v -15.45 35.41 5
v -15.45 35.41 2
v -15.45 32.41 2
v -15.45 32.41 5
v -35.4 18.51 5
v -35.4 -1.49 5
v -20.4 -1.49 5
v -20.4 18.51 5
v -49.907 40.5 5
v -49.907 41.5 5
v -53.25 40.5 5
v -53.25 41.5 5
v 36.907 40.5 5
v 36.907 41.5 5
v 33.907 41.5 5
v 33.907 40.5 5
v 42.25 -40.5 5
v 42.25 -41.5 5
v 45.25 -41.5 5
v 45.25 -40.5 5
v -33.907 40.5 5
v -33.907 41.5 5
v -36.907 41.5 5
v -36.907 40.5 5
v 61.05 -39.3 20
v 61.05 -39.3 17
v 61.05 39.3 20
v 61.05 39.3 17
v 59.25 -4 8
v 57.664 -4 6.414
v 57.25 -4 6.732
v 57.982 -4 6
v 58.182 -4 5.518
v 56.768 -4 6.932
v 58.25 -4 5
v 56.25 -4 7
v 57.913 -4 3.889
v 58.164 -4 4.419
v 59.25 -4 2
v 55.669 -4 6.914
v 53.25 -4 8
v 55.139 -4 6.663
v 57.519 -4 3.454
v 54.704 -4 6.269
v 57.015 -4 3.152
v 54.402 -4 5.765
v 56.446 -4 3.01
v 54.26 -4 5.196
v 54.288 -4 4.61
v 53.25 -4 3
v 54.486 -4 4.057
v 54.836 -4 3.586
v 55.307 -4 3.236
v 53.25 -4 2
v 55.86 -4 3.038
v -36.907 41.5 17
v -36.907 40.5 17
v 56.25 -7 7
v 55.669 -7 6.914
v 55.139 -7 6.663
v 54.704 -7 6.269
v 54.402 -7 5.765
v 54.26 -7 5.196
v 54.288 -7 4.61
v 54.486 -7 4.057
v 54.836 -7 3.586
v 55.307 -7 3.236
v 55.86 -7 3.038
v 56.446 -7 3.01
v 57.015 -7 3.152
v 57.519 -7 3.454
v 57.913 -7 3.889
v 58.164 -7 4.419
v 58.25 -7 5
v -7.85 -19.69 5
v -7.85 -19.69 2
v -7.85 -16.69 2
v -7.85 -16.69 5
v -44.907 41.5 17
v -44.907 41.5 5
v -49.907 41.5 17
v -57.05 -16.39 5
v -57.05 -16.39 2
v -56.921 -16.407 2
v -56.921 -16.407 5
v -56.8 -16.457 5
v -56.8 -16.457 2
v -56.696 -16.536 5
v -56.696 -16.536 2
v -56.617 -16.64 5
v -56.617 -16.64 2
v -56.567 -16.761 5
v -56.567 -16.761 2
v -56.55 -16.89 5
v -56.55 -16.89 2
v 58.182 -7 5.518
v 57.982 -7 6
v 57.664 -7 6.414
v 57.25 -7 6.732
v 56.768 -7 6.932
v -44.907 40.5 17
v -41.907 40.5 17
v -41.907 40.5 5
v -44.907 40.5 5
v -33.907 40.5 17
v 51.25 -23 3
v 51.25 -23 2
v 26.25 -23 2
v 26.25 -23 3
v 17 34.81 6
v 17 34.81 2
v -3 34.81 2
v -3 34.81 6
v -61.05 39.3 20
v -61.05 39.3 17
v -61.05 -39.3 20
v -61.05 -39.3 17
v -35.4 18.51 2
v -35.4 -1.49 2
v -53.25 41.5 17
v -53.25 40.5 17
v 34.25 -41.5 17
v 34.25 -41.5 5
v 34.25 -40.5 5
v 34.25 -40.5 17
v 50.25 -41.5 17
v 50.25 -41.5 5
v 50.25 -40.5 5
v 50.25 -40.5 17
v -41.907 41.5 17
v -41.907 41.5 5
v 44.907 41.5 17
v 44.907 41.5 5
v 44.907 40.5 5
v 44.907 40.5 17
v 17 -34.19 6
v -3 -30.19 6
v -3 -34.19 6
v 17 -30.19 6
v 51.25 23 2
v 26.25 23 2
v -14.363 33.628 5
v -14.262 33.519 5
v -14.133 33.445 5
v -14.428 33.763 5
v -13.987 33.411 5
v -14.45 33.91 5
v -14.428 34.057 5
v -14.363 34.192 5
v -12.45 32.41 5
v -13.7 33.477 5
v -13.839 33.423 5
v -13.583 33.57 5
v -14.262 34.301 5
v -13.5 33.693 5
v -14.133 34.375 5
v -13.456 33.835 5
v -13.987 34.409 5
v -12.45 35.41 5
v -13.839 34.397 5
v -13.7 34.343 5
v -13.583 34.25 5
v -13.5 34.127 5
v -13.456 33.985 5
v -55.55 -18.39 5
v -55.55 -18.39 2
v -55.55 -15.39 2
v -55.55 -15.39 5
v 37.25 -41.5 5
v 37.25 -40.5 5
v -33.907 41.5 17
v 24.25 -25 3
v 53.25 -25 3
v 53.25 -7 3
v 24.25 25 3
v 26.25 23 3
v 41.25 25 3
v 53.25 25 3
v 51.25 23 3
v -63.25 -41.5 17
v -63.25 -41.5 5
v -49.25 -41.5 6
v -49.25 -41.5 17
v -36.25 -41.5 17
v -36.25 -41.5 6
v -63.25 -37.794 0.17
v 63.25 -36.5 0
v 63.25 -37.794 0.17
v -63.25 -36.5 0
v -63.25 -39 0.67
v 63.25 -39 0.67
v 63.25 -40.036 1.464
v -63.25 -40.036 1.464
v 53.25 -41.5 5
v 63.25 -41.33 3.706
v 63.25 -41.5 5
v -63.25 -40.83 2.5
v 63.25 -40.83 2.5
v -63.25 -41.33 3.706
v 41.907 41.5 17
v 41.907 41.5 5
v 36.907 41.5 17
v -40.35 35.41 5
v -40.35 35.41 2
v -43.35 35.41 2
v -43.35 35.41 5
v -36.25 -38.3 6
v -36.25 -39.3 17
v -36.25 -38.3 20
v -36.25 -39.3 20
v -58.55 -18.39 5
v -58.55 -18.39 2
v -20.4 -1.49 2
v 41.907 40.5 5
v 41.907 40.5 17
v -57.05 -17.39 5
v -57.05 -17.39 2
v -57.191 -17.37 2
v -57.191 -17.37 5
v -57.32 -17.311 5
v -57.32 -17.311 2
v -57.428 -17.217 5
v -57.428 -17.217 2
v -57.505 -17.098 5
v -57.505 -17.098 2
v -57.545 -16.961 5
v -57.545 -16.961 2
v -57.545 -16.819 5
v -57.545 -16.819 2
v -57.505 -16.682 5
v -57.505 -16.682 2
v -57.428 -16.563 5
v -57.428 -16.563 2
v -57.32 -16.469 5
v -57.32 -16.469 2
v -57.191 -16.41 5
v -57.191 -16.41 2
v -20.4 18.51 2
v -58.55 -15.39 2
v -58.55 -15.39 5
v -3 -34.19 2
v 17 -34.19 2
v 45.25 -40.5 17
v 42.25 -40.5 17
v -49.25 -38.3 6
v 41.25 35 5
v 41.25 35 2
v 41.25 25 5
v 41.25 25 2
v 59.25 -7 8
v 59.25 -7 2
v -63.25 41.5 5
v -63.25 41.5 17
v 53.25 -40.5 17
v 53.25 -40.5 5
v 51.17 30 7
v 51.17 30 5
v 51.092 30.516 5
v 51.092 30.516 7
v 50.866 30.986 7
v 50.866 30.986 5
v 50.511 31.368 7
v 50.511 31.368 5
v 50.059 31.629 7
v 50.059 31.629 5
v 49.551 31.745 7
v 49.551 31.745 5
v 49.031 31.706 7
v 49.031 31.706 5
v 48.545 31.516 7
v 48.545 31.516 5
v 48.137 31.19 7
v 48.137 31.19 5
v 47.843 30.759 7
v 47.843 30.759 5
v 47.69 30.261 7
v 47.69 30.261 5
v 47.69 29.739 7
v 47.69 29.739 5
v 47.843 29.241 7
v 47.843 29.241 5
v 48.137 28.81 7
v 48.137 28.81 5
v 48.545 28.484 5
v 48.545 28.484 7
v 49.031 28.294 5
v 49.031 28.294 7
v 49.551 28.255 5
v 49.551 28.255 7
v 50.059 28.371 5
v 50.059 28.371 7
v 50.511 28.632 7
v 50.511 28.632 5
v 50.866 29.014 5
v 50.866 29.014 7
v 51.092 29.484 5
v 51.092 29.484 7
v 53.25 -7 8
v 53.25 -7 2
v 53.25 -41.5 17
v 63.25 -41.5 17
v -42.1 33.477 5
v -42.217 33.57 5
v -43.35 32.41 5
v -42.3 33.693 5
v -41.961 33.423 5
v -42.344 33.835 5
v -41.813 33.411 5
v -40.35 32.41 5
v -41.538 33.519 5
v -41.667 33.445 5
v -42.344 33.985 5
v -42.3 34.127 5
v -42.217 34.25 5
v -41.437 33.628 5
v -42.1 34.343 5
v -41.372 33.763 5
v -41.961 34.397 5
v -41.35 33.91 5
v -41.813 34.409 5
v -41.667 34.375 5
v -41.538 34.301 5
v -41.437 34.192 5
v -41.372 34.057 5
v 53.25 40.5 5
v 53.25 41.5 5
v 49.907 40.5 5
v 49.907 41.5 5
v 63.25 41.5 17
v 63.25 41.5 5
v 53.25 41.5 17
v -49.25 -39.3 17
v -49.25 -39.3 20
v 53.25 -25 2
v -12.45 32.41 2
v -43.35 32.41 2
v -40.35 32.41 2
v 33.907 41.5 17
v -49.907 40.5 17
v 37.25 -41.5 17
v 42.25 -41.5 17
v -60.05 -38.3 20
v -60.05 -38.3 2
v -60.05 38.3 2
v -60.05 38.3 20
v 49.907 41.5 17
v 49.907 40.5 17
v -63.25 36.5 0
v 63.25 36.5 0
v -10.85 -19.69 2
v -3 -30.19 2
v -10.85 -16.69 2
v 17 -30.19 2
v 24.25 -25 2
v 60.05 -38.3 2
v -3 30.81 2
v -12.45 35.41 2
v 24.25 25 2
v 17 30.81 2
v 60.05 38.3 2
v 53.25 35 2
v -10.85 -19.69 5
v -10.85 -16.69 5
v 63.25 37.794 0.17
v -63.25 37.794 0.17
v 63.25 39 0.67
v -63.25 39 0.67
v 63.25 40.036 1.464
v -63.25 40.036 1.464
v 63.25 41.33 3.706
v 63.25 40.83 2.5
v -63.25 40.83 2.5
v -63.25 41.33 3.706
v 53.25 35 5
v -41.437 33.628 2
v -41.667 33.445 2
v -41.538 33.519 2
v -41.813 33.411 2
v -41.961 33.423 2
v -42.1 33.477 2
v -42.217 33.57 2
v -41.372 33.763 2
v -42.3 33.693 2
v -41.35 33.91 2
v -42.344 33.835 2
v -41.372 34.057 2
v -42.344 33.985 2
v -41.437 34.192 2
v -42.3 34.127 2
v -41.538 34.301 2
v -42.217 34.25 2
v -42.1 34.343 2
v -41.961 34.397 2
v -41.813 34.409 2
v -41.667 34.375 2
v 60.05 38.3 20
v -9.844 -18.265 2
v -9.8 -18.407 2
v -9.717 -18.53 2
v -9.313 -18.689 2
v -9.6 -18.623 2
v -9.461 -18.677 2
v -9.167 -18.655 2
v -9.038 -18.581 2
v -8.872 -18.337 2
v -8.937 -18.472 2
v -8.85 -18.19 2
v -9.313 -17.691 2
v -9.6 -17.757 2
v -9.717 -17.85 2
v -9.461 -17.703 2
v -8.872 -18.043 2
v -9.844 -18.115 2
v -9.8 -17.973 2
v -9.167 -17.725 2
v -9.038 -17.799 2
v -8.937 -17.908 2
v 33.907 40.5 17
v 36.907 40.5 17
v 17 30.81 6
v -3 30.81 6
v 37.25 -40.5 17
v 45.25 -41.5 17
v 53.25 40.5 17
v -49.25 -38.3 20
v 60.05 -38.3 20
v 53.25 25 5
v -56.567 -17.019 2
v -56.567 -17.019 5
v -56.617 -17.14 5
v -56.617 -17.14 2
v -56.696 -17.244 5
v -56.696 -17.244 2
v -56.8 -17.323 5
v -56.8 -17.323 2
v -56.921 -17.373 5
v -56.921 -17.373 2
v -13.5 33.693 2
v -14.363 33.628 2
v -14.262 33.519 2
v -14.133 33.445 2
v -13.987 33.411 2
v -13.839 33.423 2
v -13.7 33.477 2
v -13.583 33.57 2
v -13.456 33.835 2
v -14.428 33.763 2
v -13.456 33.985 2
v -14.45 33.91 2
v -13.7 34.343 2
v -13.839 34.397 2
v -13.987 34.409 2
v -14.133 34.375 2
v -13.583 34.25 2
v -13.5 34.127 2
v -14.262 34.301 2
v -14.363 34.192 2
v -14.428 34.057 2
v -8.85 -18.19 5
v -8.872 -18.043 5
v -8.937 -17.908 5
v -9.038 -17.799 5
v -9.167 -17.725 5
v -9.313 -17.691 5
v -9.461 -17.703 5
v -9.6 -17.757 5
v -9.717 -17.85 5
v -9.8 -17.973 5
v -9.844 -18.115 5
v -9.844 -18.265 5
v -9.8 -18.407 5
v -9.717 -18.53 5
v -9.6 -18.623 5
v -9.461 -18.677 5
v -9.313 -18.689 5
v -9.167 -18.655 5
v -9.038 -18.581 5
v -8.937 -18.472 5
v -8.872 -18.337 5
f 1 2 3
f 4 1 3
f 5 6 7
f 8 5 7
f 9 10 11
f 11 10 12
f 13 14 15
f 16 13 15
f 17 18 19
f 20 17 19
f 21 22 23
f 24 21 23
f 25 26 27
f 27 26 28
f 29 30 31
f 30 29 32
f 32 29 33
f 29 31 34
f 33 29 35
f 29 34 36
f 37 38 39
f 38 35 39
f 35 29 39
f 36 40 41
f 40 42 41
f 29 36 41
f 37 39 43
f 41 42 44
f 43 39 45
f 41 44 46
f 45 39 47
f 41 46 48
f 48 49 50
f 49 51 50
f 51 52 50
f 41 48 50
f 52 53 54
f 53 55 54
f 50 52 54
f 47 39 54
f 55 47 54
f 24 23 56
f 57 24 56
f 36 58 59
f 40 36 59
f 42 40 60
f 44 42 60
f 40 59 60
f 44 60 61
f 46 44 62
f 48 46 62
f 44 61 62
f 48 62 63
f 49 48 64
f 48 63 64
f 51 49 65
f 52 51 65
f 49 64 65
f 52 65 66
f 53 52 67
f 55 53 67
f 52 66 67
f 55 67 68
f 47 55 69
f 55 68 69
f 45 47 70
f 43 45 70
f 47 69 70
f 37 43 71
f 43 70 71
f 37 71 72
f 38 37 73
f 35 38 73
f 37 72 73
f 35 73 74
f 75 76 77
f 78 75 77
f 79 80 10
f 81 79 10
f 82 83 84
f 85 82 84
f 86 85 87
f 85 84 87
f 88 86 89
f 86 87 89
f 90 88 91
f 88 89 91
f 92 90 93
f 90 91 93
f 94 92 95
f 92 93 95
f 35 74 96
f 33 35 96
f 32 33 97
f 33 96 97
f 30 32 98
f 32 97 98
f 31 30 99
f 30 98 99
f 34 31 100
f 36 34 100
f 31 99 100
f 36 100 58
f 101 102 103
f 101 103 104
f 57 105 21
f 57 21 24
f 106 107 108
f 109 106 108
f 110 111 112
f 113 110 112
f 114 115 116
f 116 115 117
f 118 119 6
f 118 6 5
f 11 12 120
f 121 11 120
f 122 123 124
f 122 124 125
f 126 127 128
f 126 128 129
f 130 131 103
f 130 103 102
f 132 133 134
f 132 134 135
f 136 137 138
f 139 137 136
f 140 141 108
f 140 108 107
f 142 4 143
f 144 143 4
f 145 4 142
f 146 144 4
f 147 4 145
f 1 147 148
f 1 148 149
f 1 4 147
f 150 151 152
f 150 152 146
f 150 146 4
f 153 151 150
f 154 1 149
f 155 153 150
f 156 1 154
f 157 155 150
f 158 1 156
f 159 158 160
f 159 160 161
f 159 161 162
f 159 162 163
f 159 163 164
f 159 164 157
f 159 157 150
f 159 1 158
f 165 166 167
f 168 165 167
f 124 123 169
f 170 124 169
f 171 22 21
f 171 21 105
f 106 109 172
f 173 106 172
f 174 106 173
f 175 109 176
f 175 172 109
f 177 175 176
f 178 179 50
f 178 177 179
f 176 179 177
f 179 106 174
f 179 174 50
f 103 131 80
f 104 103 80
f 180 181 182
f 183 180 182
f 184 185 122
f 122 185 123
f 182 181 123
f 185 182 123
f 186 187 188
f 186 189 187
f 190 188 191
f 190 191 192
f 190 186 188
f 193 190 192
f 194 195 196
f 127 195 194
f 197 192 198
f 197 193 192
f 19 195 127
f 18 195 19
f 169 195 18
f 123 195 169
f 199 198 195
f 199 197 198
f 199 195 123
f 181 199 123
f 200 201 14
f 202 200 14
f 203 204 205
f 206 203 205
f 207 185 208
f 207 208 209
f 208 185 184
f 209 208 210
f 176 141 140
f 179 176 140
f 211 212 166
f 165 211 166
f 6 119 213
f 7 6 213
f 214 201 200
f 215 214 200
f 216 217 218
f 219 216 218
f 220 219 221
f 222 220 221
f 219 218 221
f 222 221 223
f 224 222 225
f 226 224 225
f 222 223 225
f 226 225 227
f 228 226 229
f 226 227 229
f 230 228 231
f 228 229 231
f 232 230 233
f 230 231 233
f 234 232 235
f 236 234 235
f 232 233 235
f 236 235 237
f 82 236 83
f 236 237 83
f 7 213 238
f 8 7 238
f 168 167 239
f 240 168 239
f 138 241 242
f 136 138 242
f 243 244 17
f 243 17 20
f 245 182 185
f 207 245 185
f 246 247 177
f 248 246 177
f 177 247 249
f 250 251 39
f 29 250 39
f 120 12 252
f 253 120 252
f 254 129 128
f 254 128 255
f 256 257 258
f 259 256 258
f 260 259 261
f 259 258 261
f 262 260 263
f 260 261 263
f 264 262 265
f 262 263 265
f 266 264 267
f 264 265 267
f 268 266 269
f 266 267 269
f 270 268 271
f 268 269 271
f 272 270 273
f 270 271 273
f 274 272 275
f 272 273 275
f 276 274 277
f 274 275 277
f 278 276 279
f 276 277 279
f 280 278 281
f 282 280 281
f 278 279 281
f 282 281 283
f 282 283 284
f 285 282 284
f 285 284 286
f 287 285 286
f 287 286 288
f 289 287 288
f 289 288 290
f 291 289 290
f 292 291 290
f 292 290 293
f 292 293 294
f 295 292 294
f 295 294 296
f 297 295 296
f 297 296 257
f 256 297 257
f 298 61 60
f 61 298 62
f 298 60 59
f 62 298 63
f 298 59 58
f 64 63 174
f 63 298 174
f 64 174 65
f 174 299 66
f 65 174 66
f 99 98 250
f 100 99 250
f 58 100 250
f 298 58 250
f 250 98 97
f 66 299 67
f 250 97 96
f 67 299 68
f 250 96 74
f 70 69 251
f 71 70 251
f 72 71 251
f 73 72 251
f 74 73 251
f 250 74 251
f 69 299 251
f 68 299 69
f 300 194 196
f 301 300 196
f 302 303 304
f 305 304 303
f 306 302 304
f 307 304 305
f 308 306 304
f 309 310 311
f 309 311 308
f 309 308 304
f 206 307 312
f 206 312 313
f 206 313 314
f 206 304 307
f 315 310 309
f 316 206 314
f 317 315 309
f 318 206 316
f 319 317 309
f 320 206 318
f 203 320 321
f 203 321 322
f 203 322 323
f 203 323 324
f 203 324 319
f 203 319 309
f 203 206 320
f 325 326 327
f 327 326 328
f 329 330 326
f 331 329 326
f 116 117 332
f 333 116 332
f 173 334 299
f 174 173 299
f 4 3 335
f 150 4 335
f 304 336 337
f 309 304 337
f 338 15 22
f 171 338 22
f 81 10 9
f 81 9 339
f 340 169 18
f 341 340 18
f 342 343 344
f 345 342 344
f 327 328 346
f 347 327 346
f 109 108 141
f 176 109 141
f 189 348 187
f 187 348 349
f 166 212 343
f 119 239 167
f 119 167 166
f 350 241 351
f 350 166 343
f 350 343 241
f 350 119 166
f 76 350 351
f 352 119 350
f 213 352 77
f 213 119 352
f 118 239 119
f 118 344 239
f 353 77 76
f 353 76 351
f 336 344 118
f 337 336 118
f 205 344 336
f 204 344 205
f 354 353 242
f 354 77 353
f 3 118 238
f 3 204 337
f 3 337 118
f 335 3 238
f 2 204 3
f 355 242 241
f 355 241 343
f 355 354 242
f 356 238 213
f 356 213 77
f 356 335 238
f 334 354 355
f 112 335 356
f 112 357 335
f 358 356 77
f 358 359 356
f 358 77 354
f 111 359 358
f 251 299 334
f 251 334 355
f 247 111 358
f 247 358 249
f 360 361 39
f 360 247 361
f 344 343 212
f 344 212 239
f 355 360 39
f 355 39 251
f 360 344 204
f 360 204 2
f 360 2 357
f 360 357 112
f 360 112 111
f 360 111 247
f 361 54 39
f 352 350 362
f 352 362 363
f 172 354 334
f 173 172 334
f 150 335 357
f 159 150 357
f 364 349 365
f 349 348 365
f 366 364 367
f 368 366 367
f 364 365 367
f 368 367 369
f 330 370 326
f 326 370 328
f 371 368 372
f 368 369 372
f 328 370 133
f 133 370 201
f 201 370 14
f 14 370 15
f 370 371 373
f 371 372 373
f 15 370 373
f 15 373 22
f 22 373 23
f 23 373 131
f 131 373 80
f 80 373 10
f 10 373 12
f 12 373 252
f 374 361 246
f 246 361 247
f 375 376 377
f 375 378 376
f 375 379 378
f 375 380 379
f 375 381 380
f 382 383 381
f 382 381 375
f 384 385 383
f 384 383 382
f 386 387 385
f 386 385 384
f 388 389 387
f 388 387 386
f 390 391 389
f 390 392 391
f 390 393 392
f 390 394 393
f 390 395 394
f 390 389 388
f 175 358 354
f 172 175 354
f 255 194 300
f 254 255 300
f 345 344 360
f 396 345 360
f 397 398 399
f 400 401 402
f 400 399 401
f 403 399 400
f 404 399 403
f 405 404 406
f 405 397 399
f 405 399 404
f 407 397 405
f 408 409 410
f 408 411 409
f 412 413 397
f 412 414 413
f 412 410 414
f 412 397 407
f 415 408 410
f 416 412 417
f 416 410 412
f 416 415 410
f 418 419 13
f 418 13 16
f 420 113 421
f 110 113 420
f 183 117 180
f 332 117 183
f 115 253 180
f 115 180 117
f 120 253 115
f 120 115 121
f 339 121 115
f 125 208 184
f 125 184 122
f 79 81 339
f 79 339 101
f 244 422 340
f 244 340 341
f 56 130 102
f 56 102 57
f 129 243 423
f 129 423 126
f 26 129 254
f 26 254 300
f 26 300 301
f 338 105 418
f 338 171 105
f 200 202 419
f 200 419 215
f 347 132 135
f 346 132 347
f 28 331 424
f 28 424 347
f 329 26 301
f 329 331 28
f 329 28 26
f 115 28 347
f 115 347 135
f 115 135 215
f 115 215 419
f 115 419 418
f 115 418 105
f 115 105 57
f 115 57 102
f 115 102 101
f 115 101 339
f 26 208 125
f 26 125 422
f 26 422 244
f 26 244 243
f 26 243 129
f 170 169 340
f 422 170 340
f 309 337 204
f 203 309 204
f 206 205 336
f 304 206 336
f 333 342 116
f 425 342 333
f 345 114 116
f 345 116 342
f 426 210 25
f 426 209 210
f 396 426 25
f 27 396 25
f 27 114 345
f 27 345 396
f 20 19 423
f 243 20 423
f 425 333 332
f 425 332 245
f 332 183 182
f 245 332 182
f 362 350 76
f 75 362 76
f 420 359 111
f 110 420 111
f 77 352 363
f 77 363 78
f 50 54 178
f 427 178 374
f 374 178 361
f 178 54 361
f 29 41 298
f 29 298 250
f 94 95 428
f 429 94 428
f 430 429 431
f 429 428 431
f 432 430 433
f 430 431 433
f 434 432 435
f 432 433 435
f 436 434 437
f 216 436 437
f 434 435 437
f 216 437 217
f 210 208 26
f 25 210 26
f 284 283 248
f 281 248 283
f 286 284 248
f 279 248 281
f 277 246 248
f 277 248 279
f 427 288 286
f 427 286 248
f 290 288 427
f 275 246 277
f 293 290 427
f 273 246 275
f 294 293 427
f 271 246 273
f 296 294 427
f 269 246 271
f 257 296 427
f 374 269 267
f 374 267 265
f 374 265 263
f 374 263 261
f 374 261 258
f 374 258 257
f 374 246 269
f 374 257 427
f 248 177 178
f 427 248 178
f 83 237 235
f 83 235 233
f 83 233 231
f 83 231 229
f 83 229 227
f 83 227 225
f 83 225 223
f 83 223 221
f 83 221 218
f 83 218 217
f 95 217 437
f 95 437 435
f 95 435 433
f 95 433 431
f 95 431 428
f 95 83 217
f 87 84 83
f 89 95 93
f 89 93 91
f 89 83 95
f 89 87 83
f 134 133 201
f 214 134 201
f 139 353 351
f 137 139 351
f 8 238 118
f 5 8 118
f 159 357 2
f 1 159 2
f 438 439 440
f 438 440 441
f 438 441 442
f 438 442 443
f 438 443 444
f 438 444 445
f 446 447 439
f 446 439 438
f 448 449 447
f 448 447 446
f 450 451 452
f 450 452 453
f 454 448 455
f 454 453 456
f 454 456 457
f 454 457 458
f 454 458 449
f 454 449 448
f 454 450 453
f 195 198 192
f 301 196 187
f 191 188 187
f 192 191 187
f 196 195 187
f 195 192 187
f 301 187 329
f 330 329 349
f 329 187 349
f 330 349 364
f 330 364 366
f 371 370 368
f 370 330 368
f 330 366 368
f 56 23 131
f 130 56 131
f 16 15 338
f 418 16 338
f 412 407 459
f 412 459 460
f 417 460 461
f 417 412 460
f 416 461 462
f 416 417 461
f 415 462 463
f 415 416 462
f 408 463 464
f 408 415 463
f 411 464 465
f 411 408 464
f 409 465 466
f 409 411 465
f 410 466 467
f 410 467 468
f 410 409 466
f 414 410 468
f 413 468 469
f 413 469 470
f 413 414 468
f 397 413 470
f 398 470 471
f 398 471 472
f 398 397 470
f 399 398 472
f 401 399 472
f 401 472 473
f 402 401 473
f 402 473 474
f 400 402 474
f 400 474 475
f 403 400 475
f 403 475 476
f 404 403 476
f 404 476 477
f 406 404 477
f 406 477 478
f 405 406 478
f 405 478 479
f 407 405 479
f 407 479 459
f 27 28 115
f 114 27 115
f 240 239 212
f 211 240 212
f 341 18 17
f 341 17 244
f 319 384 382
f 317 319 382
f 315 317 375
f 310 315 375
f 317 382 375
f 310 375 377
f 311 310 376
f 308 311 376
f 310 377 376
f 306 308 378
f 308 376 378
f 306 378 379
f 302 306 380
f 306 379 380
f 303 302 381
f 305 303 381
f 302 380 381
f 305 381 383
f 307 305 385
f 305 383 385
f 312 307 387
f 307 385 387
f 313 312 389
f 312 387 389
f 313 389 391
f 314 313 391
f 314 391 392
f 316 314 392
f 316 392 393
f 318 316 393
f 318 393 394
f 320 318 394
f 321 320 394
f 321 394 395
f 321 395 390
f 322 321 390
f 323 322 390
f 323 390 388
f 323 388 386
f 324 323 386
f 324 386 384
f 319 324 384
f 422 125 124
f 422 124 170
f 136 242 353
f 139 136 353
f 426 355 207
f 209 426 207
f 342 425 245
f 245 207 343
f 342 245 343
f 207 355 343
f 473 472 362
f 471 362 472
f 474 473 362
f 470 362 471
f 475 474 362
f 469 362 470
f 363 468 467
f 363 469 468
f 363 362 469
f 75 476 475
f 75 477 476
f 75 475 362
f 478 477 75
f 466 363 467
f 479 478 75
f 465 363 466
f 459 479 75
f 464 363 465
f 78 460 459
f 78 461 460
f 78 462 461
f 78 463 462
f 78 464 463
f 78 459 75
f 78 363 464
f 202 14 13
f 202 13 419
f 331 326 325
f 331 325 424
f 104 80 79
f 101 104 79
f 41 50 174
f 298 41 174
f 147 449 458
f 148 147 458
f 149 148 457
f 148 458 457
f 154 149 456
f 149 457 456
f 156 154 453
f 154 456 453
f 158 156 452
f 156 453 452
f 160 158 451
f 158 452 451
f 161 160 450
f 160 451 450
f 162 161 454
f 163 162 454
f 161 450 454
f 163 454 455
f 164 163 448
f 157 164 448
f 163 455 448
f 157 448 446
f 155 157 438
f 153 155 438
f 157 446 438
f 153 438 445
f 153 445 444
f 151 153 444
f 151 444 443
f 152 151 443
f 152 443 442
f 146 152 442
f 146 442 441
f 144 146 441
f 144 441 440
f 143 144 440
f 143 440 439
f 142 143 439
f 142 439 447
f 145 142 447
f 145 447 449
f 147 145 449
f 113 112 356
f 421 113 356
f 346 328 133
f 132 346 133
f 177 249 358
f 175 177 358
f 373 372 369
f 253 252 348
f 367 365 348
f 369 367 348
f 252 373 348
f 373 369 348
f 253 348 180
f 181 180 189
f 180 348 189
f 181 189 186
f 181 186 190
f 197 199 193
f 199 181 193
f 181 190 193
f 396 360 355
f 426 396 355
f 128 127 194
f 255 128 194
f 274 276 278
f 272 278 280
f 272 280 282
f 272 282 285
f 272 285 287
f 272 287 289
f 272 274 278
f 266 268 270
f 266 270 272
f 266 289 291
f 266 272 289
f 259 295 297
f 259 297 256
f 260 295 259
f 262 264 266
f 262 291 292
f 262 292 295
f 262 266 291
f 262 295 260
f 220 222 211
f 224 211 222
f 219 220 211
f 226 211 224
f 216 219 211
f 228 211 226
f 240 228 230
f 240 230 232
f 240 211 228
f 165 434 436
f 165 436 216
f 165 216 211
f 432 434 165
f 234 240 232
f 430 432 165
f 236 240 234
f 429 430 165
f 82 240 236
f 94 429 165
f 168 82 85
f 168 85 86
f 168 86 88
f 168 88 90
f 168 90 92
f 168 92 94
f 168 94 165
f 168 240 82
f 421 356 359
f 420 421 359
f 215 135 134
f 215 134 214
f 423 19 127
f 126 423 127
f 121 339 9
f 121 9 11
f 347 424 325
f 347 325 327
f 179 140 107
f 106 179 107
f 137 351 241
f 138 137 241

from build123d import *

# Parameters (mm, degrees)
F0_W      = 13
F0_H      = 0.2
F0_H_2    = 2
F1_DEPTH  = 17
F0_W_2    = 3
F0_H_3    = 3
F0_R      = 1.75
F0_H_4    = 1
F0_R_2    = 0.5
F2_DEPTH  = 2
F3_R      = 5
F5_DEPTH  = 3
F6_START  = 2
F6_DEPTH  = 18
F0_W_3    = 7.5
F0_H_5    = 20
F7_DEPTH  = 5
F8_W      = 13
F8_H      = 11
F8_H_2    = 3
F9_DEPTH  = 4
F8_W_2    = 3
F8_H_3    = 12
F10_DEPTH = 1
F4_W      = 3.3428409398
F4_H      = 12
F4_W_2    = 3
F11_DEPTH = 1
F12_DEPTH = 8
F13_DEPTH = 7
F14_DEPTH = 6
F16_DEPTH = 3


# Not quite as in the source:
# - a feature names something its author has since deleted; it is built from what else it names


with BuildPart() as f1:
    # F0 (on Top) → F1 (new body)
    with BuildSketch(Plane.XY):
        Polygon((63.25, -41.5), (63.25, 41.5), (11.25, 41.5), (-63.25, 41.5), (-63.25, -41.5), (-56.25, -41.5), (-56.25, -39.5), (-61.25, -39.5), (-61.25, 39.5), (61.25, 39.5), (61.25, -39.5), (-43.25, -39.5), (-43.25, -41.5), align=None)
        Polygon((-43.25, -39.3), (-43.25, -39.5), (61.25, -39.5), (61.25, 39.5), (-61.25, 39.5), (-61.25, -39.5), (-56.25, -39.5), (-56.25, -39.3), (-61.05, -39.3), (-61.05, 39.3), (61.05, 39.3), (61.05, -39.3), (-2.75, -39.3), align=None)
        with Locations((-49.75, -39.4)):
            Rectangle(F0_W, F0_H)
        with Locations((-49.75, -40.5)):
            Rectangle(F0_W, F0_H_2)
    extrude(amount=F1_DEPTH)

    # F0 (on Top) → F2 (join)
    with BuildSketch(Plane.XY):
        Polygon((-56.25, -38.3), (-43.25, -38.3), (60.05, -38.3), (60.05, 38.3), (-60.05, 38.3), (-60.05, -18.19), (-60.05, -38.3), align=None)
        Polygon((-58.55, -18.39), (-58.55, -18.19), (-58.55, -15.39), (-57.05, -15.39), (-55.55, -15.39), (-55.55, -18.39), align=None, mode=Mode.SUBTRACT)
        with Locations((-9.35, -18.19)):
            Rectangle(F0_W_2, F0_H_3, mode=Mode.SUBTRACT)
        Polygon((17, -30.19), (17, -34.19), (-3, -34.19), (-3, -30.19), (1, -30.19), (15, -30.19), align=None, mode=Mode.SUBTRACT)
        Polygon((-35.4, 18.51), (-27.9, 18.51), (-20.4, 18.51), (-20.4, -1.49), (-27.9, -1.49), (-35.4, -1.49), align=None, mode=Mode.SUBTRACT)
        Polygon((-43.35, 32.41), (-43.35, 33.91), (-43.35, 35.41), (-40.35, 35.41), (-40.35, 33.91), (-40.35, 32.41), align=None, mode=Mode.SUBTRACT)
        Polygon((-15.45, 32.41), (-15.45, 33.91), (-15.45, 35.41), (-12.45, 35.41), (-12.45, 32.41), align=None, mode=Mode.SUBTRACT)
        Polygon((51.25, -25), (24.25, -25), (24.25, 25), (36.25, 25), (41.25, 25), (41.25, 35), (53.25, 35), (53.25, 30), (53.25, 25), (53.25, -4), (57.25, -4), (59.25, -4), (59.25, -7), (57.25, -7), (53.25, -7), (53.25, -25), align=None, mode=Mode.SUBTRACT)
        Polygon((-3, 30.81), (-3, 34.81), (17, 34.81), (17, 30.81), (15, 30.81), (1, 30.81), align=None, mode=Mode.SUBTRACT)
        Polygon((-43.25, -38.3), (-43.25, -39.3), (-2.75, -39.3), (61.05, -39.3), (61.05, 39.3), (-61.05, 39.3), (-61.05, -39.3), (-56.25, -39.3), (-56.25, -38.3), (-60.05, -38.3), (-60.05, -18.19), (-60.05, 38.3), (60.05, 38.3), (60.05, -38.3), align=None)
        Polygon((41.25, 35), (41.25, 25), (51.25, 25), (53.25, 25), (53.25, 30), (53.25, 35), align=None)
        with Locations((49.42, 30)):
            Circle(F0_R, mode=Mode.SUBTRACT)
        Polygon((17, 34.81), (-3, 34.81), (-3, 30.81), (1, 30.81), (15, 30.81), (17, 30.81), align=None)
        with Locations((-49.75, -40.5)):
            Rectangle(F0_W, F0_H_2)
        Polygon((53.25, -4), (53.25, -7), (57.25, -7), (59.25, -7), (59.25, -4), (57.25, -4), align=None)
        with Locations((-49.75, -38.8)):
            Rectangle(F0_W, F0_H_4)
        with Locations((49.42, 30)):
            Circle(F0_R)
        with Locations((-9.35, -18.19)):
            Rectangle(F0_W_2, F0_H_3)
        with Locations((-9.35, -18.19)):
            Circle(F0_R_2, mode=Mode.SUBTRACT)
        with Locations((-49.75, -39.4)):
            Rectangle(F0_W, F0_H)
        with Locations((-9.35, -18.19)):
            Circle(F0_R_2)
    extrude(amount=F2_DEPTH)

    # F3
    f3_edges = [f1.edges().sort_by_distance(p)[0] for p in [
        (0, 41.5, 0),
        (0, -41.5, 0),
    ]]
    fillet(f3_edges, radius=F3_R)



with BuildPart() as f2:
    # F0 (on Top) → F2, piece 2 (new body)
    with BuildSketch(Plane.XY):
        with BuildLine():
            ThreePointArc((-57.05, -16.39), (-57.55, -16.89), (-57.05, -17.39))
            Line((-57.05, -17.39), (-57.05, -16.89))
            Line((-57.05, -16.89), (-57.05, -16.39))
        make_face()
        with BuildLine():
            Line((-57.05, -16.89), (-57.05, -17.39))
            ThreePointArc((-57.05, -17.39), (-56.6964466094, -17.2435533906), (-56.55, -16.89))
            ThreePointArc((-56.55, -16.89), (-56.6964466094, -16.5364466094), (-57.05, -16.39))
            Line((-57.05, -16.39), (-57.05, -16.89))
        make_face()
    extrude(amount=F2_DEPTH)


with BuildPart() as f2b:
    # F0 (on Top) → F2, piece 3 (new body)
    with BuildSketch(Plane.XY):
        with BuildLine():
            ThreePointArc((-13.45, 33.91), (-13.95, 34.41), (-14.45, 33.91))
            ThreePointArc((-14.45, 33.91), (-13.95, 33.41), (-13.45, 33.91))
        make_face()
    extrude(amount=F2_DEPTH)


with BuildPart() as f2c:
    # F0 (on Top) → F2, piece 4 (new body)
    with BuildSketch(Plane.XY):
        with BuildLine():
            ThreePointArc((-41.35, 33.91), (-41.85, 34.41), (-42.35, 33.91))
            Line((-42.35, 33.91), (-41.85, 33.91))
            Line((-41.85, 33.91), (-41.35, 33.91))
        make_face()
        with BuildLine():
            Line((-41.85, 33.91), (-42.35, 33.91))
            ThreePointArc((-42.35, 33.91), (-41.85, 33.41), (-41.35, 33.91))
            Line((-41.35, 33.91), (-41.85, 33.91))
        make_face()
    extrude(amount=F2_DEPTH)


with BuildPart() as f2d:
    # F0 (on Top) → F2, piece 5 (new body)
    with BuildSketch(Plane.XY):
        Polygon((51.25, 23), (26.25, 23), (26.25, -23), (49.25, -23), (51.25, -23), align=None)
    extrude(amount=F2_DEPTH)


with BuildPart() as f1_1:
    add(f1.part)

    add(f2d.part)  # F5 merges F2d
    # F0 (on Top) → F5 (join)
    with BuildSketch(Plane.XY):
        Polygon((24.25, 25), (24.25, -25), (51.25, -25), (53.25, -25), (53.25, -7), (53.25, -4), (53.25, 25), (51.25, 25), (41.25, 25), (36.25, 25), align=None)
        Polygon((26.25, -23), (26.25, 23), (51.25, 23), (51.25, -23), (49.25, -23), align=None, mode=Mode.SUBTRACT)
    extrude(amount=F5_DEPTH)

    # F0 (on Top) → F6 (join)
    with BuildSketch(Plane.XY.offset(F6_START)):
        Polygon((-43.25, -38.3), (-43.25, -39.3), (-2.75, -39.3), (61.05, -39.3), (61.05, 39.3), (-61.05, 39.3), (-61.05, -39.3), (-56.25, -39.3), (-56.25, -38.3), (-60.05, -38.3), (-60.05, -18.19), (-60.05, 38.3), (60.05, 38.3), (60.05, -38.3), align=None)
        with Locations((-49.75, -38.8)):
            Rectangle(F0_W, F0_H_4)
    extrude(amount=F6_DEPTH)


    add(f2.part)  # F7 merges F2

    add(f2b.part)  # F7 merges F2b

    add(f2c.part)  # F7 merges F2c
    # F0 (on Top) → F7 (join)
    with BuildSketch(Plane.XY):
        with Locations((-24.15, 8.51)):
            Rectangle(F0_W_3, F0_H_5)
        with Locations((-31.65, 8.51)):
            Rectangle(F0_W_3, F0_H_5)
        Polygon((41.25, 35), (41.25, 25), (51.25, 25), (53.25, 25), (53.25, 30), (53.25, 35), align=None)
        with Locations((49.42, 30)):
            Circle(F0_R, mode=Mode.SUBTRACT)
        with Locations((49.42, 30)):
            Circle(F0_R)
        Polygon((-15.45, 35.41), (-15.45, 33.91), (-15.45, 32.41), (-12.45, 32.41), (-12.45, 35.41), align=None)
        with BuildLine():
            ThreePointArc((-13.45, 33.91), (-13.95, 33.41), (-14.45, 33.91))
            ThreePointArc((-14.45, 33.91), (-13.95, 34.41), (-13.45, 33.91))
        make_face(mode=Mode.SUBTRACT)
        with Locations((-9.35, -18.19)):
            Rectangle(F0_W_2, F0_H_3)
        with Locations((-9.35, -18.19)):
            Circle(F0_R_2, mode=Mode.SUBTRACT)
        with BuildLine():
            Line((-57.05, -18.19), (-58.55, -18.19))
            Line((-58.55, -18.19), (-58.55, -18.39))
            Line((-58.55, -18.39), (-55.55, -18.39))
            Line((-55.55, -18.39), (-55.55, -15.39))
            Line((-55.55, -15.39), (-57.05, -15.39))
            Line((-57.05, -15.39), (-57.05, -16.39))
            ThreePointArc((-57.05, -16.39), (-56.6964466094, -16.5364466094), (-56.55, -16.89))
            ThreePointArc((-56.55, -16.89), (-56.6964466094, -17.2435533906), (-57.05, -17.39))
            Line((-57.05, -17.39), (-57.05, -18.19))
        make_face()
        with BuildLine():
            Line((-43.35, 35.41), (-43.35, 33.91))
            Line((-43.35, 33.91), (-42.35, 33.91))
            ThreePointArc((-42.35, 33.91), (-41.85, 34.41), (-41.35, 33.91))
            Line((-41.35, 33.91), (-40.35, 33.91))
            Line((-40.35, 33.91), (-40.35, 35.41))
            Line((-40.35, 35.41), (-43.35, 35.41))
        make_face()
        with BuildLine():
            Line((-42.35, 33.91), (-43.35, 33.91))
            Line((-43.35, 33.91), (-43.35, 32.41))
            Line((-43.35, 32.41), (-40.35, 32.41))
            Line((-40.35, 32.41), (-40.35, 33.91))
            Line((-40.35, 33.91), (-41.35, 33.91))
            ThreePointArc((-41.35, 33.91), (-41.85, 33.41), (-42.35, 33.91))
        make_face()
        with BuildLine():
            Line((-58.55, -15.39), (-58.55, -18.19))
            Line((-58.55, -18.19), (-57.05, -18.19))
            Line((-57.05, -18.19), (-57.05, -17.39))
            ThreePointArc((-57.05, -17.39), (-57.55, -16.89), (-57.05, -16.39))
            Line((-57.05, -16.39), (-57.05, -15.39))
            Line((-57.05, -15.39), (-58.55, -15.39))
        make_face()
    extrude(amount=F7_DEPTH)

    # F8 (on face) → F9 (cut)
    with BuildSketch(Plane.XZ.offset(41.5)):
        with Locations((-42.75, 11.5)):
            Rectangle(F8_W, F8_H)
        with Locations((-42.75, 18.5)):
            Rectangle(F8_W, F8_H_2)
    extrude(amount=-F9_DEPTH, mode=Mode.SUBTRACT)

    # F8 (on face) → F10 (cut)
    with BuildSketch(Plane.XZ.offset(41.5)):
        Polygon((-49.25, 20), (-49.25, 17), (-49.25, 6), (-36.25, 6), (-36.25, 20), align=None)
        with Locations((51.75, 11)):
            Rectangle(F8_W_2, F8_H_3)
        with Locations((35.75, 11)):
            Rectangle(F8_W_2, F8_H_3)
        with Locations((43.75, 11)):
            Rectangle(F8_W_2, F8_H_3)
    extrude(amount=-F10_DEPTH, mode=Mode.SUBTRACT)

    # F4 (on face) → F11 (cut)
    with BuildSketch(Plane(origin=(0, 41.5, 0), x_dir=(-1, 0, 0), z_dir=(0, 1, 0))):
        with Locations((-51.5785795301, 11)):
            Rectangle(F4_W, F4_H)
        with Locations((-43.4071590602, 11)):
            Rectangle(F4_W_2, F4_H)
        with Locations((-35.4071590602, 11)):
            Rectangle(F4_W_2, F4_H)
        with Locations((35.4071590602, 11)):
            Rectangle(F4_W_2, F4_H)
        with Locations((43.4071590602, 11)):
            Rectangle(F4_W_2, F4_H)
        with Locations((51.5785795301, 11)):
            Rectangle(F4_W, F4_H)
    extrude(amount=-F11_DEPTH, mode=Mode.SUBTRACT)

    # F0 (on Top) → F12 (join)
    with BuildSketch(Plane.XY):
        Polygon((53.25, -4), (53.25, -7), (57.25, -7), (59.25, -7), (59.25, -4), (57.25, -4), align=None)
    extrude(amount=F12_DEPTH)

    # F0 (on Top) → F13 (join)
    with BuildSketch(Plane.XY):
        with Locations((49.42, 30)):
            Circle(F0_R)
    extrude(amount=F13_DEPTH)

    # F0 (on Top) → F14 (join)
    with BuildSketch(Plane.XY):
        Polygon((17, 34.81), (-3, 34.81), (-3, 30.81), (1, 30.81), (15, 30.81), (17, 30.81), align=None)
        Polygon((-3, -34.19), (17, -34.19), (17, -30.19), (15, -30.19), (1, -30.19), (-3, -30.19), align=None)
    extrude(amount=F14_DEPTH)

    # F15 (on face) → F16 (cut)
    with BuildSketch(Plane.XZ.offset(7)):
        with BuildLine():
            ThreePointArc((56.25, 7), (54.8357864376, 3.5857864376), (58.25, 5))
            ThreePointArc((58.25, 5), (57.6642135624, 6.4142135624), (56.25, 7))
        make_face()
    extrude(amount=-F16_DEPTH, mode=Mode.SUBTRACT)


solid = f1_1.part
